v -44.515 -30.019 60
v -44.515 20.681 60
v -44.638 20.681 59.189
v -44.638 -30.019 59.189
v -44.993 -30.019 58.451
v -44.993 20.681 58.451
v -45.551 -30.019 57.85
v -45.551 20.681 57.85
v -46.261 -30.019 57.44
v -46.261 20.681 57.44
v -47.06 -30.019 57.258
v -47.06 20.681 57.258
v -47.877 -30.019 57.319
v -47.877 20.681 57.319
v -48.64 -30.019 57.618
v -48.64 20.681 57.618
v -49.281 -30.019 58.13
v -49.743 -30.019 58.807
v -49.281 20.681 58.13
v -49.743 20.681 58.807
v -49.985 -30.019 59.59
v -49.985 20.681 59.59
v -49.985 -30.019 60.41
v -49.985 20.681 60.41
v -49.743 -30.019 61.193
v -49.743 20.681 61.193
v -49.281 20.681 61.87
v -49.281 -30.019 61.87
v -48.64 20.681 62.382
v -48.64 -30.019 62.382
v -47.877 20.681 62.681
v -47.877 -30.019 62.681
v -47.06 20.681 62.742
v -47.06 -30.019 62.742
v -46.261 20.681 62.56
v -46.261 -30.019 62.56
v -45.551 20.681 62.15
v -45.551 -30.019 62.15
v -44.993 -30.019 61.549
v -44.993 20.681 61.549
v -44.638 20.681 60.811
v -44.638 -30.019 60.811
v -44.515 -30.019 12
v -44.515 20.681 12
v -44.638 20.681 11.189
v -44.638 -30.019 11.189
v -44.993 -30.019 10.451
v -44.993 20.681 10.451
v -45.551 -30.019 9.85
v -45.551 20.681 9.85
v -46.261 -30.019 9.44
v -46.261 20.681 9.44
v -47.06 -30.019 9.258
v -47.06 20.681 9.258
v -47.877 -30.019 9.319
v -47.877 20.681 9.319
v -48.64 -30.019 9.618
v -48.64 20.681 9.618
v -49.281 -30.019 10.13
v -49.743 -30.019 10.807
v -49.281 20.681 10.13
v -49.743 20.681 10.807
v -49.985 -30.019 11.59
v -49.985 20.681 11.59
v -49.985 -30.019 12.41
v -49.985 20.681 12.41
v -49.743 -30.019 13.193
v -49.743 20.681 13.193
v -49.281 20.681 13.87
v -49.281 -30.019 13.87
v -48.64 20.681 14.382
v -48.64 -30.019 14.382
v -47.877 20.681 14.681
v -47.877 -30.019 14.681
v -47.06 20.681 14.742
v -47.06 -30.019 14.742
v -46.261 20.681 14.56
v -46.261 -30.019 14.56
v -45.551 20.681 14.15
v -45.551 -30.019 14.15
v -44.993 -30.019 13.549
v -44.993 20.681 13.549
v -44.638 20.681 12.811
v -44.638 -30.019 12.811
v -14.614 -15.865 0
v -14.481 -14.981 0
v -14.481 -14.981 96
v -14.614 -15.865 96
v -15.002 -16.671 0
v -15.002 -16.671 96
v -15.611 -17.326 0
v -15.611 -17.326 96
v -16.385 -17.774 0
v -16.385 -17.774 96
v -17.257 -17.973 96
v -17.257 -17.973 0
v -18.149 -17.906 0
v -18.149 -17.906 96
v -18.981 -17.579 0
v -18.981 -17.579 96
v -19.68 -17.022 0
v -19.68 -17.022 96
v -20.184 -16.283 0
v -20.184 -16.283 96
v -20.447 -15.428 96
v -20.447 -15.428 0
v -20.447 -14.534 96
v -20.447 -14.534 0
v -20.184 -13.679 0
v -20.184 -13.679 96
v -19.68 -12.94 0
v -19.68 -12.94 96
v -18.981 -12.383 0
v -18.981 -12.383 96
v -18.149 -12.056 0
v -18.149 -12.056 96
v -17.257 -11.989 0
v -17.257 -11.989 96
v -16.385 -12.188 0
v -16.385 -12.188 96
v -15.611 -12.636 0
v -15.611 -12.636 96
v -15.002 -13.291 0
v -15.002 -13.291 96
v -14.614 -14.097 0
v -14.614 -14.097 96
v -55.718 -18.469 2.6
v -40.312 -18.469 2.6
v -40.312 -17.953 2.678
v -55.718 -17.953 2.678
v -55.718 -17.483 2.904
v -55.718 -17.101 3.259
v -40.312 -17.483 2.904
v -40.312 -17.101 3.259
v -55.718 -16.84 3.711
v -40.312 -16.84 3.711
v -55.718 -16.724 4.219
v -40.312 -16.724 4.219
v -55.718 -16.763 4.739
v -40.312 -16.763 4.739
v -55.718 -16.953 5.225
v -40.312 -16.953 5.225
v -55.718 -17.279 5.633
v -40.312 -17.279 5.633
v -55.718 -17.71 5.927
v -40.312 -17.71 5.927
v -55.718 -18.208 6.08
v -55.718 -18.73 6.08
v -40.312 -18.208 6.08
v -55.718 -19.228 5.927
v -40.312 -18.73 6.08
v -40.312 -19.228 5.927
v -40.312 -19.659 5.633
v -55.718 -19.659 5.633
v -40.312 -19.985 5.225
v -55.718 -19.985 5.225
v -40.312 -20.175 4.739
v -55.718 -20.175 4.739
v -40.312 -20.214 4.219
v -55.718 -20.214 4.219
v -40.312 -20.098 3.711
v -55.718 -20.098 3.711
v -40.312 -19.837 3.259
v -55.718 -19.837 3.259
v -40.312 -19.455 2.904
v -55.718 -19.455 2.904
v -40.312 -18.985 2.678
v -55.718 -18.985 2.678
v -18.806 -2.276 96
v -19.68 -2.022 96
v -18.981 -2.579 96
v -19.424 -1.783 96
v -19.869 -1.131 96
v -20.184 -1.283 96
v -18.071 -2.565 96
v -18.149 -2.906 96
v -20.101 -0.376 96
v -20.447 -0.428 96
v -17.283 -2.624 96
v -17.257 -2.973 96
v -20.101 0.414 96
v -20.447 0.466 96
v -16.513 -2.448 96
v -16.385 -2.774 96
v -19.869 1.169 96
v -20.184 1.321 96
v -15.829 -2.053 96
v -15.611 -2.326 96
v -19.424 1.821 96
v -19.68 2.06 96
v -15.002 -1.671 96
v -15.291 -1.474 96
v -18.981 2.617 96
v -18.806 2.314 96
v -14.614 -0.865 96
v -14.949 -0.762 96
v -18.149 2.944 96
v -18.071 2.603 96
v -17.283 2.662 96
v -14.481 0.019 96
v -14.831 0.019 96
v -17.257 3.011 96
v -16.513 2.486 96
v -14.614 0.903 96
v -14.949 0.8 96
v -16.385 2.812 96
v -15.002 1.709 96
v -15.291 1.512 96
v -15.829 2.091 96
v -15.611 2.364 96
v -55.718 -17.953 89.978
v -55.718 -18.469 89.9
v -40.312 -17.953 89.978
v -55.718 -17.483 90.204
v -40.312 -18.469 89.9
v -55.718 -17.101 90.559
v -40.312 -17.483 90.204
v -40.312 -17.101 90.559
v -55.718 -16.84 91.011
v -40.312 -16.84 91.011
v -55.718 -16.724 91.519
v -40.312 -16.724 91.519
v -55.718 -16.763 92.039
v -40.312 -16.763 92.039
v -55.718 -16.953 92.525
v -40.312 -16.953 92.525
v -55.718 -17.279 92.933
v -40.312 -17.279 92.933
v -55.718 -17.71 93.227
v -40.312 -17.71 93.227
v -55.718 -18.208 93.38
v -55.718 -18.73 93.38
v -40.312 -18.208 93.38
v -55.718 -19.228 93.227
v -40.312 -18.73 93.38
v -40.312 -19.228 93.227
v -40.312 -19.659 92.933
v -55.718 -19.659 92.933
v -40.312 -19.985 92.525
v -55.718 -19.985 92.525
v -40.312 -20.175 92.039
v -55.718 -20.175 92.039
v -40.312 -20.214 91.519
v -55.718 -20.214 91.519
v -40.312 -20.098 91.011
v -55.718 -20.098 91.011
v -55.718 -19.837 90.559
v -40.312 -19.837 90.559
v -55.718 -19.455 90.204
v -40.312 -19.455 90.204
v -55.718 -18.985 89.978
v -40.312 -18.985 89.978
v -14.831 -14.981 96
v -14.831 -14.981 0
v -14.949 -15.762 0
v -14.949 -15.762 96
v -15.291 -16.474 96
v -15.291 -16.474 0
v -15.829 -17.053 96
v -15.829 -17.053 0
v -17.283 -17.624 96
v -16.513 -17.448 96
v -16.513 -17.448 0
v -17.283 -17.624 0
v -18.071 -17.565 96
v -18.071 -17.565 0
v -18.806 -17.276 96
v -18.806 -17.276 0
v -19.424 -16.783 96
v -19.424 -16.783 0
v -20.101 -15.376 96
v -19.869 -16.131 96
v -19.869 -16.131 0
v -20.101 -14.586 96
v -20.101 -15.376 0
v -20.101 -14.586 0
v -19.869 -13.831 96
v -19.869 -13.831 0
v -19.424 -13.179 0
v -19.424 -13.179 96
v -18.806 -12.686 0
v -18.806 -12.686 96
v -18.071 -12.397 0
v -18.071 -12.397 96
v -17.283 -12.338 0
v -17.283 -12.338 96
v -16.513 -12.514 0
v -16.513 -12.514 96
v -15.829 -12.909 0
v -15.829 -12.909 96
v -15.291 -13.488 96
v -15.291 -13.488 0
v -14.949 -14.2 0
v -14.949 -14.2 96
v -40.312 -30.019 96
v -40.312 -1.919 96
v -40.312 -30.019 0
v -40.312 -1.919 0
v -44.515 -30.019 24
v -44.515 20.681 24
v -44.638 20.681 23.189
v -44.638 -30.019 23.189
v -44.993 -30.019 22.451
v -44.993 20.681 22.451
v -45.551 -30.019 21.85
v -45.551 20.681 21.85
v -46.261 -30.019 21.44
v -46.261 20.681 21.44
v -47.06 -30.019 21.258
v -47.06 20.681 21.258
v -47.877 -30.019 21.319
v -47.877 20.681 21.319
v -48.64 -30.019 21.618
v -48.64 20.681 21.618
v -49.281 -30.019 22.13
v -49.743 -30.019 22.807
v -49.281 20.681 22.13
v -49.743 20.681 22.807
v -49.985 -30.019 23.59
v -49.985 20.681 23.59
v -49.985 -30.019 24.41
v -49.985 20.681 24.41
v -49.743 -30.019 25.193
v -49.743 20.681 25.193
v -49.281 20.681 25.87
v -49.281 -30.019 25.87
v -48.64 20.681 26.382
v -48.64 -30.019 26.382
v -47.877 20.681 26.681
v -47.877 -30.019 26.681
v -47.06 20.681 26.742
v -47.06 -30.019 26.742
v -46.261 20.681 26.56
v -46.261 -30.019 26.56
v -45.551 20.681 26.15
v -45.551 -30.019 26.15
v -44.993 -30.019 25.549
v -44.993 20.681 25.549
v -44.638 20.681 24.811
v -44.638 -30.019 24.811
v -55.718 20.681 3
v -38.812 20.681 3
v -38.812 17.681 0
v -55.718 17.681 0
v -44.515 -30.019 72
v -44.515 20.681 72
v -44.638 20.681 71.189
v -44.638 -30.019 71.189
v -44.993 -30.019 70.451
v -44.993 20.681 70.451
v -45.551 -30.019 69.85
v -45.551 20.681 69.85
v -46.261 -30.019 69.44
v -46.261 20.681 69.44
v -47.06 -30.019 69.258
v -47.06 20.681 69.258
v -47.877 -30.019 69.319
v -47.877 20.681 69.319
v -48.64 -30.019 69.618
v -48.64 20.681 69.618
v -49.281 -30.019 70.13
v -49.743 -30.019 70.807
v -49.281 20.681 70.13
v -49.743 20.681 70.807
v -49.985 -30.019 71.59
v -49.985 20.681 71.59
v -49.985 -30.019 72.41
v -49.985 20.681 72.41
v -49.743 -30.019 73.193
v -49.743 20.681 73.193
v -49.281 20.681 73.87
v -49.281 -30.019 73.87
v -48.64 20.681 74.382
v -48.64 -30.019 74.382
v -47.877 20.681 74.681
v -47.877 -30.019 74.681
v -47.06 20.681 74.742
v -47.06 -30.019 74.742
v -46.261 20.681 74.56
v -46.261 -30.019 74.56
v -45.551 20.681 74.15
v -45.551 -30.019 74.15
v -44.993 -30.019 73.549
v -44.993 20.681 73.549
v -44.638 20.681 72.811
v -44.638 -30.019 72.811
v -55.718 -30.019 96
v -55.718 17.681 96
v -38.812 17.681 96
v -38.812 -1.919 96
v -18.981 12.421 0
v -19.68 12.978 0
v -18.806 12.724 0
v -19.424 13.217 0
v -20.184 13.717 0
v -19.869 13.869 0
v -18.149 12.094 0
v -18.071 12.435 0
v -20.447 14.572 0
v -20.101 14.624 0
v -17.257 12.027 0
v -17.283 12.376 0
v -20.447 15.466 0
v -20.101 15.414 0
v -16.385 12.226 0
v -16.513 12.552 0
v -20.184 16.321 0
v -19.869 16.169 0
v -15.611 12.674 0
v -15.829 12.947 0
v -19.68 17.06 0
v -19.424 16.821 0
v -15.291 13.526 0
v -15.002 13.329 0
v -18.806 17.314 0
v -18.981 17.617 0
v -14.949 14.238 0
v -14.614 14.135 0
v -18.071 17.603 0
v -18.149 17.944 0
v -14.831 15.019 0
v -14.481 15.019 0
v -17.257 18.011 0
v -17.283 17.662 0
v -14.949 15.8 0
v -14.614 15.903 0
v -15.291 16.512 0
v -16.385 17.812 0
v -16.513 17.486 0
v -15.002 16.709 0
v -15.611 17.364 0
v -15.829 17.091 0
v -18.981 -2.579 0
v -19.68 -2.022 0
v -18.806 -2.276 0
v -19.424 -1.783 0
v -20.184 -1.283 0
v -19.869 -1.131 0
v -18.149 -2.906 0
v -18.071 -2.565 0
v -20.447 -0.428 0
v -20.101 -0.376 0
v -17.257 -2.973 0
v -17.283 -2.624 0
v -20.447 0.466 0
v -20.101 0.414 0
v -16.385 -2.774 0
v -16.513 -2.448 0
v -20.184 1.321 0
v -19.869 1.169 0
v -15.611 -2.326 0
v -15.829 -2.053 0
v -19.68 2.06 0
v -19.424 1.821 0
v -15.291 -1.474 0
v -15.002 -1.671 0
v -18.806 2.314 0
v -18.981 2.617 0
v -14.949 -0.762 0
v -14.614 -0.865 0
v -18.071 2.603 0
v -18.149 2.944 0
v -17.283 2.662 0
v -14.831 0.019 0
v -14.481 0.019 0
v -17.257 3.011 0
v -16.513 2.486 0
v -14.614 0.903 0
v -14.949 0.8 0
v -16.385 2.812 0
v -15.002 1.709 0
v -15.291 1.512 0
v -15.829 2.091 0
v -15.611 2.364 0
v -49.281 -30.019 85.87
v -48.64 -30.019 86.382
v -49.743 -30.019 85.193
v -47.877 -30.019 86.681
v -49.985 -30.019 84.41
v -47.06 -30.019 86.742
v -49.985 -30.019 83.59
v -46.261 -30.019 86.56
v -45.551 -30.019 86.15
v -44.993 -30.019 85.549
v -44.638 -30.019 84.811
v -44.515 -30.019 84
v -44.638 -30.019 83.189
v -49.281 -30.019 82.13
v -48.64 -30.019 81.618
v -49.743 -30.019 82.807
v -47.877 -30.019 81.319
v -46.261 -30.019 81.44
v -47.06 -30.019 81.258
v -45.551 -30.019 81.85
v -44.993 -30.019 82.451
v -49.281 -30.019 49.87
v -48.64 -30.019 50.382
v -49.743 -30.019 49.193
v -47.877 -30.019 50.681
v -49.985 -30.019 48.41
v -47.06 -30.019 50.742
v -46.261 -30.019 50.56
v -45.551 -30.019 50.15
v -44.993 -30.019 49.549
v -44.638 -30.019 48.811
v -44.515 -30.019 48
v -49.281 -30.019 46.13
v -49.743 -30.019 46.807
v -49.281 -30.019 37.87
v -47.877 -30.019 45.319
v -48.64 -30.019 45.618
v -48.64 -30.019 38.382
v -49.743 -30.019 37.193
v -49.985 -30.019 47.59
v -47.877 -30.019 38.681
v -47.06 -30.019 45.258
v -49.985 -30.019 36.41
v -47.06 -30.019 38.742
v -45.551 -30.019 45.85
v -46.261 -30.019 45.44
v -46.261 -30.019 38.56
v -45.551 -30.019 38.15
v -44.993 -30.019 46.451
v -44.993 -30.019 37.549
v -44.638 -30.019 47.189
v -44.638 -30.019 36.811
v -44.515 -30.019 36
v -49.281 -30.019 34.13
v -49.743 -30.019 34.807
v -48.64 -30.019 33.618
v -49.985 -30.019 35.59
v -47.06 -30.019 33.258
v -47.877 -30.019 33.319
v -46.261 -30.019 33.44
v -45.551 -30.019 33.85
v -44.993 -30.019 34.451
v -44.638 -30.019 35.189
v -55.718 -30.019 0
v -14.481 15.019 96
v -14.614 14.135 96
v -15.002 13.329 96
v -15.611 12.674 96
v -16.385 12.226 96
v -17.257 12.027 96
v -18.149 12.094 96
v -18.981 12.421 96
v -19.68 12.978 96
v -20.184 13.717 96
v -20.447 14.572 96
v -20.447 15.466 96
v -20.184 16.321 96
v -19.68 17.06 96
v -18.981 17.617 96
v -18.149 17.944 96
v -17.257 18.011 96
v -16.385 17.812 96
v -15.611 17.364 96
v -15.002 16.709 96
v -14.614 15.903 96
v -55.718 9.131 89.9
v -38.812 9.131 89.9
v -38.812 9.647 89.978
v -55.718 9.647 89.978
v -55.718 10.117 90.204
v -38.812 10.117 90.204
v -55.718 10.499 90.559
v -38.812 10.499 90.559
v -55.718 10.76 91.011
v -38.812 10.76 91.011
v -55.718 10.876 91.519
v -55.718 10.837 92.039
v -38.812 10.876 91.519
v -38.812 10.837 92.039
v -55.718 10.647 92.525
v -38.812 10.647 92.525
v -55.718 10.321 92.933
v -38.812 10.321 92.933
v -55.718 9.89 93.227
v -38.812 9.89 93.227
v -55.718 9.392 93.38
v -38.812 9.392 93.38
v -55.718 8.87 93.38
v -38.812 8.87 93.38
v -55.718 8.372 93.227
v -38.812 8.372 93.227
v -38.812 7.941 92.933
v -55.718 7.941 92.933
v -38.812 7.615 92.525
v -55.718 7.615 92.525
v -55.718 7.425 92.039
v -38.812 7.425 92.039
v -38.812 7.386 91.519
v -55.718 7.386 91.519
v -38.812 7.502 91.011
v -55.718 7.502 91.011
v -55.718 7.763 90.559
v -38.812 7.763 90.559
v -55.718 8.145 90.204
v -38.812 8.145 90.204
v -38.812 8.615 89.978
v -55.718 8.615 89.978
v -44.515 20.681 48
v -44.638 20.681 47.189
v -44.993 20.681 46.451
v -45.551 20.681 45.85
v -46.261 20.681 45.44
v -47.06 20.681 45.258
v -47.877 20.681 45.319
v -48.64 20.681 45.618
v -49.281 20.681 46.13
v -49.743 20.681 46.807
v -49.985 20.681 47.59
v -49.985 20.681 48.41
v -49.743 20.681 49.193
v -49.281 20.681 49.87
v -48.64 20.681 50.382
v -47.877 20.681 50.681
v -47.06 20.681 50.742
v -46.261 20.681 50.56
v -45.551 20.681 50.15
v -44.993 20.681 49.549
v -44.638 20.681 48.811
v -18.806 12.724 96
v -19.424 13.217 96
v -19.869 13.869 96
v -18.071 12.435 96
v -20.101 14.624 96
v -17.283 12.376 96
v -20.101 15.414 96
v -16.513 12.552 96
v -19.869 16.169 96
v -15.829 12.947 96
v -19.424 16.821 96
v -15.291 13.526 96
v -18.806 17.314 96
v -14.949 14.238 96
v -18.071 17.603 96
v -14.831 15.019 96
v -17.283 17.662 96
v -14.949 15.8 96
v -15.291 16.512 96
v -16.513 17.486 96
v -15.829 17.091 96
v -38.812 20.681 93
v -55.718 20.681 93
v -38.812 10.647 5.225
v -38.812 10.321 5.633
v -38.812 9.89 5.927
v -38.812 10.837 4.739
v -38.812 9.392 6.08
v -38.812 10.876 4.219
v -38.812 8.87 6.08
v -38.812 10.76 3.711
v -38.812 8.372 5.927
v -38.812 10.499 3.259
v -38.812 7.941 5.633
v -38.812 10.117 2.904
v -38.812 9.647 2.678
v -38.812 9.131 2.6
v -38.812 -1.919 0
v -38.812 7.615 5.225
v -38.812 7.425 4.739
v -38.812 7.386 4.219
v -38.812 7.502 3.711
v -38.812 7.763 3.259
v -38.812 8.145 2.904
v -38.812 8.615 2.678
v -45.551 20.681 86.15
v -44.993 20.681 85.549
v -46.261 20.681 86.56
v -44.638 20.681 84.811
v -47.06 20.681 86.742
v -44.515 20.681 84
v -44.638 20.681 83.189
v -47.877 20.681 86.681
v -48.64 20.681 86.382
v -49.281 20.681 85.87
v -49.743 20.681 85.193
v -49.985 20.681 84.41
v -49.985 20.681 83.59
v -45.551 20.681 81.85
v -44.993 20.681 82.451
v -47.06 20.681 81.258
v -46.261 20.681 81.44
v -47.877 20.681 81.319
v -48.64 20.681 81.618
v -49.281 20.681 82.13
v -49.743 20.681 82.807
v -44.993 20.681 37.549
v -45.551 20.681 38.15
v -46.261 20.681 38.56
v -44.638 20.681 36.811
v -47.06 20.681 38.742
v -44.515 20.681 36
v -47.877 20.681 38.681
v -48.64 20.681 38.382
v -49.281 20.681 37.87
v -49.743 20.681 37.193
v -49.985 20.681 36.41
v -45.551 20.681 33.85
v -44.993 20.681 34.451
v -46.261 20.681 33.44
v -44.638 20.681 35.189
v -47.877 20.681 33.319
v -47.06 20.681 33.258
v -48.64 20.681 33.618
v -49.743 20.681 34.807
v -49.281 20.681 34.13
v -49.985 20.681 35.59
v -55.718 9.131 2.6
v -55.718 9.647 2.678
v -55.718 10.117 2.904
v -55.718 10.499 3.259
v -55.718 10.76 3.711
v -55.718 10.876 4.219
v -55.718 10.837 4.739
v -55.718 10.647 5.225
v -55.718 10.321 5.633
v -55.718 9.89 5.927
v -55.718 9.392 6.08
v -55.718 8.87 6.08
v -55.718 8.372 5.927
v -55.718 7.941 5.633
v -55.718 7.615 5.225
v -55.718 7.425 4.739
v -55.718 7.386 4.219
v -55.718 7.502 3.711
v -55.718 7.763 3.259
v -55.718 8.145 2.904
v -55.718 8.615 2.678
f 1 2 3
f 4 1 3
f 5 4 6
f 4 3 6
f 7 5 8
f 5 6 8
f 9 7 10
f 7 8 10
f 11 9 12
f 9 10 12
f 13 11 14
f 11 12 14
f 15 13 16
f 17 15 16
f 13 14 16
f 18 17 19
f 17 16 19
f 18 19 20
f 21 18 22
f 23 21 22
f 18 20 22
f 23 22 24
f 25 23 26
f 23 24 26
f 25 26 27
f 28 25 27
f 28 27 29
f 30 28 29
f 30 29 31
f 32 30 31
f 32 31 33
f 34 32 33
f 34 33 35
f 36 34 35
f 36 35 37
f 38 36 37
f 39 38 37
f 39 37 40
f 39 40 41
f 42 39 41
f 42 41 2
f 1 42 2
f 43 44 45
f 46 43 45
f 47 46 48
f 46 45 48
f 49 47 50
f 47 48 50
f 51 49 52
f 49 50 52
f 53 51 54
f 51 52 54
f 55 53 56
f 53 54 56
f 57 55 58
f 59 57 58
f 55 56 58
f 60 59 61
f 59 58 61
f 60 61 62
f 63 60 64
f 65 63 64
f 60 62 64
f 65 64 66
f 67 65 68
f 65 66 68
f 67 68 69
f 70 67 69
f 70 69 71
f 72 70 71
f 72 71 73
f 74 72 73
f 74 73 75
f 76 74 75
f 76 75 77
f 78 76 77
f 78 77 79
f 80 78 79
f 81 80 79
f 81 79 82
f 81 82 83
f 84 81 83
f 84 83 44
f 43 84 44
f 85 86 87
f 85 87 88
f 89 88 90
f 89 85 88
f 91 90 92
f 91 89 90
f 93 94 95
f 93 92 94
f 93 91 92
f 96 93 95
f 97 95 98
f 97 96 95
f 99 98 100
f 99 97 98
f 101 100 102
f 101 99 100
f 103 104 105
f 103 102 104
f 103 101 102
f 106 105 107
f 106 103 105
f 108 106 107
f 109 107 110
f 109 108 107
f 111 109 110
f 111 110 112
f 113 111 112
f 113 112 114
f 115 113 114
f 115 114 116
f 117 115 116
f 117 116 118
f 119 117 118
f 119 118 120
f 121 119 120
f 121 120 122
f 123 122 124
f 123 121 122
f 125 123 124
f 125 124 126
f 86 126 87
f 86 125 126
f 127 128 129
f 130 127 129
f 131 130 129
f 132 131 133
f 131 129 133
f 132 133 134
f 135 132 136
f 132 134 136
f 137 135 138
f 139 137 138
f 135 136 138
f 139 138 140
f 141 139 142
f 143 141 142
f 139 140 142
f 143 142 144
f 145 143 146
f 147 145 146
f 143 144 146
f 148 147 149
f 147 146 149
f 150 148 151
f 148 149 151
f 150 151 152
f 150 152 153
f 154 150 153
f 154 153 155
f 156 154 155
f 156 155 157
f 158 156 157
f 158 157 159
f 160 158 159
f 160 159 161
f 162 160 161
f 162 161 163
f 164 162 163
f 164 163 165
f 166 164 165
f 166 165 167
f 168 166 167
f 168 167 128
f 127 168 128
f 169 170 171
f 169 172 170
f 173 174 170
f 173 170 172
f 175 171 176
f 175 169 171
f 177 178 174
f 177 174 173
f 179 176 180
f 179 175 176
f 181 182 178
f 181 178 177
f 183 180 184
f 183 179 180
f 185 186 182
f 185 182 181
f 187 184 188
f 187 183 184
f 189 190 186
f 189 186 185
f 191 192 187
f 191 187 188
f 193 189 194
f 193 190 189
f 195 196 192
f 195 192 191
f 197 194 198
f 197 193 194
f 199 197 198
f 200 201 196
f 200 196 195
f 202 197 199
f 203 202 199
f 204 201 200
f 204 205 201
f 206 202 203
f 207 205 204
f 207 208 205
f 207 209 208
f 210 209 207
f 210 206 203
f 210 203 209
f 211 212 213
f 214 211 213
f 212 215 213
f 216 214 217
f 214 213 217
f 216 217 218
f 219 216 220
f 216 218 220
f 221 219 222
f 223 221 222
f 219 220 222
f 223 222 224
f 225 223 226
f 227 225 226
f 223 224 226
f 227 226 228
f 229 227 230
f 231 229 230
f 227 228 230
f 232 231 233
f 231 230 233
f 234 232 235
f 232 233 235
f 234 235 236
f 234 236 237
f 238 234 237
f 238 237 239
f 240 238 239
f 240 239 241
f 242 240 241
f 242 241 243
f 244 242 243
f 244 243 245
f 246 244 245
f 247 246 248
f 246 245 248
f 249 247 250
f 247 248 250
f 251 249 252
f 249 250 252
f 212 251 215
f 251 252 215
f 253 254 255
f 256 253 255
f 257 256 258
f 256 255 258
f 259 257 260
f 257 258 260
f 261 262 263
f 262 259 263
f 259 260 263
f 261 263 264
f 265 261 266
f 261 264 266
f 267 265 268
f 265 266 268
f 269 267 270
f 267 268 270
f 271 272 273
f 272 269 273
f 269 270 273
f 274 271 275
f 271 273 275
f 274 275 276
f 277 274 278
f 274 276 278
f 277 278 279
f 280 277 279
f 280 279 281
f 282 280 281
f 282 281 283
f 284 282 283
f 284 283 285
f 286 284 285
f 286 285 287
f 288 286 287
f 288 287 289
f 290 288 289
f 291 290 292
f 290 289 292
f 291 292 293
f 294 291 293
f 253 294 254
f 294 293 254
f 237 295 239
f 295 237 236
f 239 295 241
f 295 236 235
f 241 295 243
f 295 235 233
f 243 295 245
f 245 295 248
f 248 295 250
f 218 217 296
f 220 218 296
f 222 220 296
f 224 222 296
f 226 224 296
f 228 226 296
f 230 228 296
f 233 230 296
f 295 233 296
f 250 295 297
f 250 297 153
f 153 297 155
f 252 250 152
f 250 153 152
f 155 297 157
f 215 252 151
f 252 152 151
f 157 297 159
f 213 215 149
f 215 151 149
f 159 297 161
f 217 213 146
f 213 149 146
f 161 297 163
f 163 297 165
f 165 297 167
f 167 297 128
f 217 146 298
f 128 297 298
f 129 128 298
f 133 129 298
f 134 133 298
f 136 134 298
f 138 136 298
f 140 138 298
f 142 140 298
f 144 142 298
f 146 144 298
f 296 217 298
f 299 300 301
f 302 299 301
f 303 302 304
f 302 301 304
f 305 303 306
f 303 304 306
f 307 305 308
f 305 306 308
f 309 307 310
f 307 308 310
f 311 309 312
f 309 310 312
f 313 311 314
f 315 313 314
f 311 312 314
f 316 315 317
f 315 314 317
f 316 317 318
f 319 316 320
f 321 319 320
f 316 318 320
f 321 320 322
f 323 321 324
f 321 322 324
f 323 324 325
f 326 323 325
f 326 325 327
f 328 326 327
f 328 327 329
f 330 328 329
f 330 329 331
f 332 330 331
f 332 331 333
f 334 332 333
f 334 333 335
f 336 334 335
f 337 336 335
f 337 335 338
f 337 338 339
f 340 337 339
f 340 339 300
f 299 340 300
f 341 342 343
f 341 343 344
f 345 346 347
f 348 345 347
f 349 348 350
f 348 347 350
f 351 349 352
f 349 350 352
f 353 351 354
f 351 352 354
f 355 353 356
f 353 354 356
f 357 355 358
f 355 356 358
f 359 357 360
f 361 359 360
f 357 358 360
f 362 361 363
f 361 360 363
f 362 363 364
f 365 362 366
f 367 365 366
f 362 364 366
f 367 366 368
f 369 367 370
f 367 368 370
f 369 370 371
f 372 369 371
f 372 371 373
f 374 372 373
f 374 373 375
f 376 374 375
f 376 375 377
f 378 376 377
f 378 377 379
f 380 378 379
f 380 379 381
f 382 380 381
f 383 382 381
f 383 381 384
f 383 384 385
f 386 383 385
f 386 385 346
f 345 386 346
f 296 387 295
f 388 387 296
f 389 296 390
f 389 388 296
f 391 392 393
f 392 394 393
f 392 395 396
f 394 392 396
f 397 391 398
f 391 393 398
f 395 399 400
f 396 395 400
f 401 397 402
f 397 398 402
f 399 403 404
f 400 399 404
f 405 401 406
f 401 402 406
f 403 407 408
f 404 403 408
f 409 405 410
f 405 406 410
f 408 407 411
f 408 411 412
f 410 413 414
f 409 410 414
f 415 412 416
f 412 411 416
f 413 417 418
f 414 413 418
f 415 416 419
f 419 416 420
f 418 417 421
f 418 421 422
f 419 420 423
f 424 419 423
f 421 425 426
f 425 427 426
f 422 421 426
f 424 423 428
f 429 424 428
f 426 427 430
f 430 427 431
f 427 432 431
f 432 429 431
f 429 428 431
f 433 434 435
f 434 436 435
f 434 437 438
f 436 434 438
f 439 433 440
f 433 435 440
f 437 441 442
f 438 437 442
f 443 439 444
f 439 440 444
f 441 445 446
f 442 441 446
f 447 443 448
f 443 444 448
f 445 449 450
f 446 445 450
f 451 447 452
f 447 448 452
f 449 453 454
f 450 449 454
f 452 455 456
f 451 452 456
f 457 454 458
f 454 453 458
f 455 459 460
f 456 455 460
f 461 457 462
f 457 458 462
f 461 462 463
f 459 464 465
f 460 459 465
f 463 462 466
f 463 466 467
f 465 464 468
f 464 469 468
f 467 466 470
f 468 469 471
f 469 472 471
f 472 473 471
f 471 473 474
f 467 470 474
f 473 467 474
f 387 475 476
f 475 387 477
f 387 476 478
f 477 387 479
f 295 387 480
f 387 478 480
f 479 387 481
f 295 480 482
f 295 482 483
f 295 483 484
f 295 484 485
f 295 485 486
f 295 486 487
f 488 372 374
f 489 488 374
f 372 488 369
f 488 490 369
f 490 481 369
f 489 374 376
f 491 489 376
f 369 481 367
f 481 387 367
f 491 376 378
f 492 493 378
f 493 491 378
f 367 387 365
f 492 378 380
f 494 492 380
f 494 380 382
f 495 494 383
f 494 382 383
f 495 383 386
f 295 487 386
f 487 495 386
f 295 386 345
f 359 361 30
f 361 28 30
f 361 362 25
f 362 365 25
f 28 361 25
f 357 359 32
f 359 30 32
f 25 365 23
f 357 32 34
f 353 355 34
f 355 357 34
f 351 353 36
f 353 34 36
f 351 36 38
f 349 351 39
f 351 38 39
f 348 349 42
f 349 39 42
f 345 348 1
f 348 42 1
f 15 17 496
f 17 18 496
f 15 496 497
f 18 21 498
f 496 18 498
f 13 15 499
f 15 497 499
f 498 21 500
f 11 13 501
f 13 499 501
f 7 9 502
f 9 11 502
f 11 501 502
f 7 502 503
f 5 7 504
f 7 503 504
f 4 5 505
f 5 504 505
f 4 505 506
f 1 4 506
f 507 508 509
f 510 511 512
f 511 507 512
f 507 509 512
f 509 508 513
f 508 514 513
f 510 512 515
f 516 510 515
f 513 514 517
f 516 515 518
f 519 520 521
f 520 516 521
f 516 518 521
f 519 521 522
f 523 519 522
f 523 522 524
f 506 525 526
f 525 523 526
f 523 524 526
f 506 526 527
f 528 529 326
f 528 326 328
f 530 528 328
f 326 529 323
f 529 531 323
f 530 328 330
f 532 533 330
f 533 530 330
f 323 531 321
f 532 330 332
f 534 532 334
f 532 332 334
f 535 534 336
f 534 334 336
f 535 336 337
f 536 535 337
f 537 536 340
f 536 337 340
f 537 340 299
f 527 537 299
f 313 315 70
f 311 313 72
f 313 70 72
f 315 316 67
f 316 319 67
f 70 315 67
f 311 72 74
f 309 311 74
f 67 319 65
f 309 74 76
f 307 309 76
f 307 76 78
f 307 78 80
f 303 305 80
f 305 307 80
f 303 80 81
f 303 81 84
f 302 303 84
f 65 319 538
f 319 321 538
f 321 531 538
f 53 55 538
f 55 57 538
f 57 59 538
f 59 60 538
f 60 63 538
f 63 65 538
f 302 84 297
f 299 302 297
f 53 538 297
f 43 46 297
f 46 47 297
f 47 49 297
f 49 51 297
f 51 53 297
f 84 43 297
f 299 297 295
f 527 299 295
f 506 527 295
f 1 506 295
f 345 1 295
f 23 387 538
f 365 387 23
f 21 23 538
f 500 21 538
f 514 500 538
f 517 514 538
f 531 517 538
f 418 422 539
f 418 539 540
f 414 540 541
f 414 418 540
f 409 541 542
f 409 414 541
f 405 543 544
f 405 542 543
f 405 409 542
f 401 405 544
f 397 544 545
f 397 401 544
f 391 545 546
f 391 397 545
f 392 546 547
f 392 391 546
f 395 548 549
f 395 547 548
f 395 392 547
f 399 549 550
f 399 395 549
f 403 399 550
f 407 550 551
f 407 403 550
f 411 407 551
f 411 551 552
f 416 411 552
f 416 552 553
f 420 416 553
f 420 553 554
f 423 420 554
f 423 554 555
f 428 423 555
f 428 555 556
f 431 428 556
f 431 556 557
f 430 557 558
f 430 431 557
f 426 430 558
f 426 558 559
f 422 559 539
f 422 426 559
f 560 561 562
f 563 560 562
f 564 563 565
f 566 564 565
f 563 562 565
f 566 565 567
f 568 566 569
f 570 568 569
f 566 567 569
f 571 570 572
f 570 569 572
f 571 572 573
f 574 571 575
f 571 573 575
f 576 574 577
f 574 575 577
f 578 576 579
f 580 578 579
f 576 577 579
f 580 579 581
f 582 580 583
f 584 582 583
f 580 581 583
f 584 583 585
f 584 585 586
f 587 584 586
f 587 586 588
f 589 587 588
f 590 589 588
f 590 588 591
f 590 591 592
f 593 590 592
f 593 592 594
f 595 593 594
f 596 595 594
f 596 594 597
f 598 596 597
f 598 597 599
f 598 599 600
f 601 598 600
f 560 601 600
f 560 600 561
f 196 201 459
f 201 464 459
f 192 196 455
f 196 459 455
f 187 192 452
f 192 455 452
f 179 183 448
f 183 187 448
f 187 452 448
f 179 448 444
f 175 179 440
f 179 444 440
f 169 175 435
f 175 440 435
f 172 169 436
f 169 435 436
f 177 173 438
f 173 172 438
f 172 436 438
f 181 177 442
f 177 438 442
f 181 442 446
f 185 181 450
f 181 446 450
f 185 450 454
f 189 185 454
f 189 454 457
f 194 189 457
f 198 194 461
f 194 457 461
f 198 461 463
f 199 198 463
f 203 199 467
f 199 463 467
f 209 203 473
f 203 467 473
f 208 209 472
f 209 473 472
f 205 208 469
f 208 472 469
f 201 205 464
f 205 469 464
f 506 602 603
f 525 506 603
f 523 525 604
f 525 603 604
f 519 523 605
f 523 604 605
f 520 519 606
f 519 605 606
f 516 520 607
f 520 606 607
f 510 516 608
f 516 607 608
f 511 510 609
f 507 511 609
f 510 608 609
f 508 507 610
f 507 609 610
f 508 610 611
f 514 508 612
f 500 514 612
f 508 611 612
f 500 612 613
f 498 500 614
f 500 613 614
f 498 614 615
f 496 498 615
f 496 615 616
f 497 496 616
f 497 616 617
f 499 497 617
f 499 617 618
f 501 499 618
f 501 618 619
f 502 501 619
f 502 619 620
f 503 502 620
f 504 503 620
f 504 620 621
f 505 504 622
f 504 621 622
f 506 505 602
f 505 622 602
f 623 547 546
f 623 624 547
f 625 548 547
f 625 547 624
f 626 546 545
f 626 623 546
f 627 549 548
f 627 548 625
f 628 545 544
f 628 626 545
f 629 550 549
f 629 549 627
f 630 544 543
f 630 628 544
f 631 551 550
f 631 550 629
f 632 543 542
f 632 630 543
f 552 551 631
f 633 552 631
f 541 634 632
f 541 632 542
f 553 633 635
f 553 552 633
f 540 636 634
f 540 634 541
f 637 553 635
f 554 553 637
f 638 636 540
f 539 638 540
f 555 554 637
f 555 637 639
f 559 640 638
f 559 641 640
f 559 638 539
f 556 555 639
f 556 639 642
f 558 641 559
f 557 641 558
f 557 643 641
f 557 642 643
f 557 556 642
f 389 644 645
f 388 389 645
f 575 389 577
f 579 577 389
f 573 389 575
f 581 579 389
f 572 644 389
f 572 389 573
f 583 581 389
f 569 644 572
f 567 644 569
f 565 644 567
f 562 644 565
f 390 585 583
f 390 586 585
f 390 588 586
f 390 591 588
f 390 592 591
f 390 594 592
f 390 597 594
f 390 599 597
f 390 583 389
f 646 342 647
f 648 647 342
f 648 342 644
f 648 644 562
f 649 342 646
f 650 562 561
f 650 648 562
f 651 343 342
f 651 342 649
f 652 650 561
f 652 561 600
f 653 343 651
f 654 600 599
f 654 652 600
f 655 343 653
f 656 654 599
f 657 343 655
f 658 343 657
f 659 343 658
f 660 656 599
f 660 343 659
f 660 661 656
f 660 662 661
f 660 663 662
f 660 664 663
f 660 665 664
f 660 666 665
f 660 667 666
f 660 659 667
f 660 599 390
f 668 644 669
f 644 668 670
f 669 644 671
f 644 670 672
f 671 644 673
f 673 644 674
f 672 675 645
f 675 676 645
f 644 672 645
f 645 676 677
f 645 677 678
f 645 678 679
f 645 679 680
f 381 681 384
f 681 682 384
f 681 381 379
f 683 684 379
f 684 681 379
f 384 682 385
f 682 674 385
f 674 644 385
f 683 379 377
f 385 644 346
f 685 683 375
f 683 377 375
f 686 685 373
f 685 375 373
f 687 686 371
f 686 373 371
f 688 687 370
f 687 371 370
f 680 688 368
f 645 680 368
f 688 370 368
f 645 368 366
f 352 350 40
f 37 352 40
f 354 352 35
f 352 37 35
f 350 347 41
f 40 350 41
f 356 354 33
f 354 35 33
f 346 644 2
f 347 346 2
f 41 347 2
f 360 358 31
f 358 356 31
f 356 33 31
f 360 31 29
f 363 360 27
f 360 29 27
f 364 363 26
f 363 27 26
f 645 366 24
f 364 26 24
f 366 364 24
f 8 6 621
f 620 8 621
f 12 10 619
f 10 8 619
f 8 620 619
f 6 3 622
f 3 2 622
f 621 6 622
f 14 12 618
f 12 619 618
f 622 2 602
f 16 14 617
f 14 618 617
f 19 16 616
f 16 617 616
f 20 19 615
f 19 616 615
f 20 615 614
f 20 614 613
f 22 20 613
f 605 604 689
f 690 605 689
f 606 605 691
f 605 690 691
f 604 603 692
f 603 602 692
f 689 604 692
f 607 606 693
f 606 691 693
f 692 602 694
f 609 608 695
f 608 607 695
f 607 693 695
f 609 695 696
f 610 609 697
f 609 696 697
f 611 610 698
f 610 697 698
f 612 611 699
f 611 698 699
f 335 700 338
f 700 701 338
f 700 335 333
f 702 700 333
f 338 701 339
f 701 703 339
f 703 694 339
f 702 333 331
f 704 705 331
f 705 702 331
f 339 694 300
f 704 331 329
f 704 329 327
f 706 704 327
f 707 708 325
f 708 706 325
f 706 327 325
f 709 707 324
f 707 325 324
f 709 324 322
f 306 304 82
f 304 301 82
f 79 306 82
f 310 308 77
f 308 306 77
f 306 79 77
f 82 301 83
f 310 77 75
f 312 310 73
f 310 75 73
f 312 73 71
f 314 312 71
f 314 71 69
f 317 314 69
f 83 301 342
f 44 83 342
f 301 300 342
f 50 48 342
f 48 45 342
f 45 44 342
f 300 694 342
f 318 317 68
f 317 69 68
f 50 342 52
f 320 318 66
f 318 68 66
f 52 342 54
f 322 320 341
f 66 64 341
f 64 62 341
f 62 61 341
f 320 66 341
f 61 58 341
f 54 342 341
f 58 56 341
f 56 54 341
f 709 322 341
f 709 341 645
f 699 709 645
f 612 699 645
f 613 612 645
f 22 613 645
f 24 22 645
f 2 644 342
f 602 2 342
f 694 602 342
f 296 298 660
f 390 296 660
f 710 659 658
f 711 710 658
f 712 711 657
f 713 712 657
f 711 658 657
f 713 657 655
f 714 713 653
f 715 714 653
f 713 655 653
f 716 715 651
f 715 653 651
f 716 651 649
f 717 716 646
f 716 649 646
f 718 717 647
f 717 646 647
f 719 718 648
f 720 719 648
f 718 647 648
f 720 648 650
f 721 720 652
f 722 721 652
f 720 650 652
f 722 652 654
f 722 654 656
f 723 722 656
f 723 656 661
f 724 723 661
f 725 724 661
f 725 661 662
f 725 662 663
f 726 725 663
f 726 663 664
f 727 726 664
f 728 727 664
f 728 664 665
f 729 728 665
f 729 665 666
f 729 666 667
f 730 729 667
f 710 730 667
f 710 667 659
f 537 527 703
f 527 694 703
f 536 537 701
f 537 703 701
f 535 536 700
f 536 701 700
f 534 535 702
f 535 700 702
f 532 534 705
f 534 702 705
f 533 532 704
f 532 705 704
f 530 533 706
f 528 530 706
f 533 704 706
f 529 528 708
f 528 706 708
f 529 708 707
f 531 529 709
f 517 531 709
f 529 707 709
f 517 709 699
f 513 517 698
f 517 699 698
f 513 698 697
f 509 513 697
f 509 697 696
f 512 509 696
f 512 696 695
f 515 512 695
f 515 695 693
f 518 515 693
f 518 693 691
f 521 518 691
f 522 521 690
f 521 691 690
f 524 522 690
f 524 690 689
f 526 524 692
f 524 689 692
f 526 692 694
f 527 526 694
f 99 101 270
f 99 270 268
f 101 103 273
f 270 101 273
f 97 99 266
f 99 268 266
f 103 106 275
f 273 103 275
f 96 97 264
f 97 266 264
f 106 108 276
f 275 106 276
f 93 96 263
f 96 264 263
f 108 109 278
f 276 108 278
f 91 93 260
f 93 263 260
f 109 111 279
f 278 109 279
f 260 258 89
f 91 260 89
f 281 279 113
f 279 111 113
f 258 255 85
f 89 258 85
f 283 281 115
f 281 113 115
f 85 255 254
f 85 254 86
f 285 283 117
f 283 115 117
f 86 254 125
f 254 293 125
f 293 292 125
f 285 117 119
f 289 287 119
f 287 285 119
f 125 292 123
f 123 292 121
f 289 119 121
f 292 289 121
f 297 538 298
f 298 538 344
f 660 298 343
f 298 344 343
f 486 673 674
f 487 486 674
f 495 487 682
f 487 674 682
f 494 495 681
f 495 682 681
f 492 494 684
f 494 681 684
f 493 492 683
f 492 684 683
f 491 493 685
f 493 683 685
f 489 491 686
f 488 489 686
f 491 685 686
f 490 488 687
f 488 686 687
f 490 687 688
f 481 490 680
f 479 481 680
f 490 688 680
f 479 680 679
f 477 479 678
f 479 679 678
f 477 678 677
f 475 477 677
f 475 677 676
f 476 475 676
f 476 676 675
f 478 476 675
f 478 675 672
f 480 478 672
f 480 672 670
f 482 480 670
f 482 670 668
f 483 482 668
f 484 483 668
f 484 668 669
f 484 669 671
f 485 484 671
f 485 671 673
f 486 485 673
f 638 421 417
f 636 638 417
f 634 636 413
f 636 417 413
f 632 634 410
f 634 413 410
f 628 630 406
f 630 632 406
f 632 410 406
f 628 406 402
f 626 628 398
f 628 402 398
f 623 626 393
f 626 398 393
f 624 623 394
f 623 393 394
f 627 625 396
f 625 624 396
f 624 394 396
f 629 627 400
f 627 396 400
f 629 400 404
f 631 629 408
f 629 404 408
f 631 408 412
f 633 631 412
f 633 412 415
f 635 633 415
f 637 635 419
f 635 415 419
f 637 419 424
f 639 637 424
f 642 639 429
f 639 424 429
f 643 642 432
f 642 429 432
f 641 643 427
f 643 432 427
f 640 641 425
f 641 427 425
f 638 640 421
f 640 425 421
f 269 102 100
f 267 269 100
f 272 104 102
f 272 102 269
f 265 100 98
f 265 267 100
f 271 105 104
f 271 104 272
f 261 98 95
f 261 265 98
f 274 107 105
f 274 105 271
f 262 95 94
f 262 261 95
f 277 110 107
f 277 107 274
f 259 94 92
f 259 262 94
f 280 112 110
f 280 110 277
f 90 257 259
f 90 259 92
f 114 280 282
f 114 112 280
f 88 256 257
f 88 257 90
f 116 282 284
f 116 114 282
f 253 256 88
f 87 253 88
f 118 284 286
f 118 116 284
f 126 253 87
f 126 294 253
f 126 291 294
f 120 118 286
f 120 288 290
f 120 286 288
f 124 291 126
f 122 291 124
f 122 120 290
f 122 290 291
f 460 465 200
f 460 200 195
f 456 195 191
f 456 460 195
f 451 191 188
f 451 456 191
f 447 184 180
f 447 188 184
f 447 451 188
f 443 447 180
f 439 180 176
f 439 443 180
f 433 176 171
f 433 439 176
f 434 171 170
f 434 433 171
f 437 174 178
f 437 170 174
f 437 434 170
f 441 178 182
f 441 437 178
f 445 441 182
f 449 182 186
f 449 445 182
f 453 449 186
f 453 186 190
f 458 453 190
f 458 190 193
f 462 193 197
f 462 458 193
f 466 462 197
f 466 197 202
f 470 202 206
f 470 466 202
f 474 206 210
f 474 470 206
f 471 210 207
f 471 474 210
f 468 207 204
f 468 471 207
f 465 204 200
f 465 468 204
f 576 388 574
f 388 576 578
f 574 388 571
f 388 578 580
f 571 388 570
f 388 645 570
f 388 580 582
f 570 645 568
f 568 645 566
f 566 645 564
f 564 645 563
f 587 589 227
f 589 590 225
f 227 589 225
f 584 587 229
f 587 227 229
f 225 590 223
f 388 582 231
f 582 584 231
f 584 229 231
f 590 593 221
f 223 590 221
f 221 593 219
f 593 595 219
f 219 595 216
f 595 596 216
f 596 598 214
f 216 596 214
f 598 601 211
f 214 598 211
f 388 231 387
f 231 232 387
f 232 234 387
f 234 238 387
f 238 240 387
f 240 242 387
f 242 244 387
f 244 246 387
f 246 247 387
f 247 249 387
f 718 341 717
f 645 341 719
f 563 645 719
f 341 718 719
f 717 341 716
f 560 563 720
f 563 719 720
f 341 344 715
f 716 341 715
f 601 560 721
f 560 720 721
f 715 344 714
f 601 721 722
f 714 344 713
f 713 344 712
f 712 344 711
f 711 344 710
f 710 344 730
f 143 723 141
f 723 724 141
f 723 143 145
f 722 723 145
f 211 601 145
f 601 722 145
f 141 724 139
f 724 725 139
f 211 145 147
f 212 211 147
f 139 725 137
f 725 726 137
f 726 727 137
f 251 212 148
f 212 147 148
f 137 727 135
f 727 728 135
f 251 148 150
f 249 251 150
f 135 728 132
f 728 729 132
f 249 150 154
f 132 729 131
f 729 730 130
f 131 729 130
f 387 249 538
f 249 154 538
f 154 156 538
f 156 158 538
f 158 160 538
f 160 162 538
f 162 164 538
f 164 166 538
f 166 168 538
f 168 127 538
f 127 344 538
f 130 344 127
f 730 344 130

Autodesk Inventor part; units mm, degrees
ref_plane "YZ Plane" through (0, 0, 0) normal (1, 0, 0) x (0, 1, 0)
ref_plane "XZ Plane" through (0, 0, 0) normal (0, 1, 0) x (-1, 0, 0)
ref_plane "XY Plane" through (0, 0, 0) normal (0, 0, 1) x (1, 0, 0)
ref_plane "Work Plane1" through (0, 0, 0) normal (0, 0, 1) x (1, 0, 0)
sketch "Sketch1" plane through (0, 0, 0) normal (0, 0, 1) x (1, 0, 0)
  line L0 (-40.3123, -16.219) -> (-40.3123, -1.919) projected
  line L1 (-38.8123, 20.681) -> (-36.2123, 20.681) projected
  line L2 (-38.8123, 20.681) -> (-38.8123, 11.381) projected
  line L3 (-38.8123, 6.881) -> (-38.8123, -7.419) projected
  line L4 (-38.8123, 11.381) -> (-38.8123, 6.881) projected
  line L5 (-55.7184, -30.019) -> (-40.3123, -30.019)
  line L6 (-40.3123, -30.019) -> (-40.3123, -1.919)
  line L7 (-40.3123, -1.919) -> (-55.7184, -1.919)
  line L8 (-55.7184, -1.919) -> (-55.7184, -30.019)
  line L9 (-55.7184, -1.919) -> (-38.8123, -1.919)
  line L10 (-38.8123, -1.919) -> (-38.8123, 20.681)
  line L11 (-38.8123, 20.681) -> (-55.7184, 20.681)
  line L12 (-55.7184, 20.681) -> (-55.7184, -1.919)
  circle A0 centre (-17.481, -14.981) radius 3 projected
  circle A1 centre (-17.481, 0.019) radius 3 projected
  circle A2 centre (-17.481, 15.019) radius 3 projected
  circle A3 centre (-17.481, 15.019) radius 2.65
  circle A4 centre (-17.481, -14.981) radius 2.65
  circle A5 centre (-17.481, 0.019) radius 2.65
  point P0 (0, 0)
  point P1 (-40.3123, -30.019)
  dimension "d9" = 6
  dimension "d10" = 5.3
  dimension "d11" = 5.3
  dimension "d12" = 5.3
extrude "Extrusion1" add sketch "Sketch1" along normal blind 96
sketch "Sketch2" plane through (-38.8123, -1.919, 0) normal (1, 0, 0) x (0, 0, -1)
  arc A0 (-4.35, 13.3) -> (-4.35, 8.8) centre (-4.35, 11.05) ccw projected
  arc A1 (-4.35, -14.3) -> (-4.35, -18.8) centre (-4.35, -16.55) ccw projected
  circle A2 centre (-4.35, 11.05) radius 1.75
  circle A3 centre (-4.35, -16.55) radius 1.75
  line L0 (-96, 22.6) -> (-96, -28.1) projected
  line L1 (0, 22.6) -> (0, -28.1) projected
  line L2 (-96, 22.6) -> (0, 22.6)
  line L3 (0, 22.6) -> (-48, 22.6)
  line L4 (-48, -36.2747) -> (-48, 22.6)
  circle A4 centre (-91.65, 11.05) radius 1.75
  circle A5 centre (-91.65, -16.55) radius 1.75
  point P0 (0, 1.919)
  dimension "d2" = 3.5
  dimension "d3" = 3.5
extrude "Extrusion2" cut sketch "Sketch2" against normal through all
chamfer "Chamfer1" distance 3 angle 45 2 edges at (-47.2653, 20.681, 0) (-47.2653, 20.681, 96)
sketch "Sketch3" plane through (-55.7184, 20.681, 93) normal (0, 1, 0) x (1, 0, 0)
  line L0 (0, -3) -> (16.9061, -3) projected
  line L1 (16.9061, -3) -> (0, -3)
  line L2 (8.453, -3) -> (8.453, 93)
  circle A0 centre (8.453, 9) radius 2.75
  line L3 (0, -3) -> (0, 93)
  line L4 (0, 93) -> (0, 45)
  line L5 (0, 90) -> (0, 0) projected
  line L6 (15.4061, 93) -> (15.4061, -3) projected
  line L7 (15.4061, 45) -> (0, 45)
  line L8 (35.5874, -3) -> (35.5874, 93) projected
  circle A1 centre (8.453, 21) radius 2.75
  circle A2 centre (8.453, 33) radius 2.75
  circle A3 centre (8.453, 45) radius 2.75
  line L9 (16.9061, 0) -> (0, 0) projected
  circle A4 centre (8.453, 81) radius 2.75
  circle A5 centre (8.453, 69) radius 2.75
  circle A6 centre (8.453, 57) radius 2.75
  point P0 (55.7184, 93)
  dimension "d13" = 5.5
  dimension "d14" = 12
  dimension "d15" = 5.5
  dimension "d16" = 12
  dimension "d17" = 5.5
  dimension "d18" = 12
  dimension "d19" = 5.5
  dimension "d20" = 45
  dimension "d21" = 48
  dimension "d22" = 12
  dimension "d23" = 12
extrude "Extrusion3" cut sketch "Sketch3" against normal through all contours A0 L2 | L2 A0 | A3 L2 L7 | L7 L2 A3 | L7 A3 L2 | L2 A3 L7 | A1 L2 | L2 A1 | A2 L2 | L2 A2 | A6 L2 | L2 A6 | A5 L2 | L2 A5 | A4 L2 | L2 A4
chamfer "Chamfer2" [suppressed]
properties part number "stepper motor controller mount"
